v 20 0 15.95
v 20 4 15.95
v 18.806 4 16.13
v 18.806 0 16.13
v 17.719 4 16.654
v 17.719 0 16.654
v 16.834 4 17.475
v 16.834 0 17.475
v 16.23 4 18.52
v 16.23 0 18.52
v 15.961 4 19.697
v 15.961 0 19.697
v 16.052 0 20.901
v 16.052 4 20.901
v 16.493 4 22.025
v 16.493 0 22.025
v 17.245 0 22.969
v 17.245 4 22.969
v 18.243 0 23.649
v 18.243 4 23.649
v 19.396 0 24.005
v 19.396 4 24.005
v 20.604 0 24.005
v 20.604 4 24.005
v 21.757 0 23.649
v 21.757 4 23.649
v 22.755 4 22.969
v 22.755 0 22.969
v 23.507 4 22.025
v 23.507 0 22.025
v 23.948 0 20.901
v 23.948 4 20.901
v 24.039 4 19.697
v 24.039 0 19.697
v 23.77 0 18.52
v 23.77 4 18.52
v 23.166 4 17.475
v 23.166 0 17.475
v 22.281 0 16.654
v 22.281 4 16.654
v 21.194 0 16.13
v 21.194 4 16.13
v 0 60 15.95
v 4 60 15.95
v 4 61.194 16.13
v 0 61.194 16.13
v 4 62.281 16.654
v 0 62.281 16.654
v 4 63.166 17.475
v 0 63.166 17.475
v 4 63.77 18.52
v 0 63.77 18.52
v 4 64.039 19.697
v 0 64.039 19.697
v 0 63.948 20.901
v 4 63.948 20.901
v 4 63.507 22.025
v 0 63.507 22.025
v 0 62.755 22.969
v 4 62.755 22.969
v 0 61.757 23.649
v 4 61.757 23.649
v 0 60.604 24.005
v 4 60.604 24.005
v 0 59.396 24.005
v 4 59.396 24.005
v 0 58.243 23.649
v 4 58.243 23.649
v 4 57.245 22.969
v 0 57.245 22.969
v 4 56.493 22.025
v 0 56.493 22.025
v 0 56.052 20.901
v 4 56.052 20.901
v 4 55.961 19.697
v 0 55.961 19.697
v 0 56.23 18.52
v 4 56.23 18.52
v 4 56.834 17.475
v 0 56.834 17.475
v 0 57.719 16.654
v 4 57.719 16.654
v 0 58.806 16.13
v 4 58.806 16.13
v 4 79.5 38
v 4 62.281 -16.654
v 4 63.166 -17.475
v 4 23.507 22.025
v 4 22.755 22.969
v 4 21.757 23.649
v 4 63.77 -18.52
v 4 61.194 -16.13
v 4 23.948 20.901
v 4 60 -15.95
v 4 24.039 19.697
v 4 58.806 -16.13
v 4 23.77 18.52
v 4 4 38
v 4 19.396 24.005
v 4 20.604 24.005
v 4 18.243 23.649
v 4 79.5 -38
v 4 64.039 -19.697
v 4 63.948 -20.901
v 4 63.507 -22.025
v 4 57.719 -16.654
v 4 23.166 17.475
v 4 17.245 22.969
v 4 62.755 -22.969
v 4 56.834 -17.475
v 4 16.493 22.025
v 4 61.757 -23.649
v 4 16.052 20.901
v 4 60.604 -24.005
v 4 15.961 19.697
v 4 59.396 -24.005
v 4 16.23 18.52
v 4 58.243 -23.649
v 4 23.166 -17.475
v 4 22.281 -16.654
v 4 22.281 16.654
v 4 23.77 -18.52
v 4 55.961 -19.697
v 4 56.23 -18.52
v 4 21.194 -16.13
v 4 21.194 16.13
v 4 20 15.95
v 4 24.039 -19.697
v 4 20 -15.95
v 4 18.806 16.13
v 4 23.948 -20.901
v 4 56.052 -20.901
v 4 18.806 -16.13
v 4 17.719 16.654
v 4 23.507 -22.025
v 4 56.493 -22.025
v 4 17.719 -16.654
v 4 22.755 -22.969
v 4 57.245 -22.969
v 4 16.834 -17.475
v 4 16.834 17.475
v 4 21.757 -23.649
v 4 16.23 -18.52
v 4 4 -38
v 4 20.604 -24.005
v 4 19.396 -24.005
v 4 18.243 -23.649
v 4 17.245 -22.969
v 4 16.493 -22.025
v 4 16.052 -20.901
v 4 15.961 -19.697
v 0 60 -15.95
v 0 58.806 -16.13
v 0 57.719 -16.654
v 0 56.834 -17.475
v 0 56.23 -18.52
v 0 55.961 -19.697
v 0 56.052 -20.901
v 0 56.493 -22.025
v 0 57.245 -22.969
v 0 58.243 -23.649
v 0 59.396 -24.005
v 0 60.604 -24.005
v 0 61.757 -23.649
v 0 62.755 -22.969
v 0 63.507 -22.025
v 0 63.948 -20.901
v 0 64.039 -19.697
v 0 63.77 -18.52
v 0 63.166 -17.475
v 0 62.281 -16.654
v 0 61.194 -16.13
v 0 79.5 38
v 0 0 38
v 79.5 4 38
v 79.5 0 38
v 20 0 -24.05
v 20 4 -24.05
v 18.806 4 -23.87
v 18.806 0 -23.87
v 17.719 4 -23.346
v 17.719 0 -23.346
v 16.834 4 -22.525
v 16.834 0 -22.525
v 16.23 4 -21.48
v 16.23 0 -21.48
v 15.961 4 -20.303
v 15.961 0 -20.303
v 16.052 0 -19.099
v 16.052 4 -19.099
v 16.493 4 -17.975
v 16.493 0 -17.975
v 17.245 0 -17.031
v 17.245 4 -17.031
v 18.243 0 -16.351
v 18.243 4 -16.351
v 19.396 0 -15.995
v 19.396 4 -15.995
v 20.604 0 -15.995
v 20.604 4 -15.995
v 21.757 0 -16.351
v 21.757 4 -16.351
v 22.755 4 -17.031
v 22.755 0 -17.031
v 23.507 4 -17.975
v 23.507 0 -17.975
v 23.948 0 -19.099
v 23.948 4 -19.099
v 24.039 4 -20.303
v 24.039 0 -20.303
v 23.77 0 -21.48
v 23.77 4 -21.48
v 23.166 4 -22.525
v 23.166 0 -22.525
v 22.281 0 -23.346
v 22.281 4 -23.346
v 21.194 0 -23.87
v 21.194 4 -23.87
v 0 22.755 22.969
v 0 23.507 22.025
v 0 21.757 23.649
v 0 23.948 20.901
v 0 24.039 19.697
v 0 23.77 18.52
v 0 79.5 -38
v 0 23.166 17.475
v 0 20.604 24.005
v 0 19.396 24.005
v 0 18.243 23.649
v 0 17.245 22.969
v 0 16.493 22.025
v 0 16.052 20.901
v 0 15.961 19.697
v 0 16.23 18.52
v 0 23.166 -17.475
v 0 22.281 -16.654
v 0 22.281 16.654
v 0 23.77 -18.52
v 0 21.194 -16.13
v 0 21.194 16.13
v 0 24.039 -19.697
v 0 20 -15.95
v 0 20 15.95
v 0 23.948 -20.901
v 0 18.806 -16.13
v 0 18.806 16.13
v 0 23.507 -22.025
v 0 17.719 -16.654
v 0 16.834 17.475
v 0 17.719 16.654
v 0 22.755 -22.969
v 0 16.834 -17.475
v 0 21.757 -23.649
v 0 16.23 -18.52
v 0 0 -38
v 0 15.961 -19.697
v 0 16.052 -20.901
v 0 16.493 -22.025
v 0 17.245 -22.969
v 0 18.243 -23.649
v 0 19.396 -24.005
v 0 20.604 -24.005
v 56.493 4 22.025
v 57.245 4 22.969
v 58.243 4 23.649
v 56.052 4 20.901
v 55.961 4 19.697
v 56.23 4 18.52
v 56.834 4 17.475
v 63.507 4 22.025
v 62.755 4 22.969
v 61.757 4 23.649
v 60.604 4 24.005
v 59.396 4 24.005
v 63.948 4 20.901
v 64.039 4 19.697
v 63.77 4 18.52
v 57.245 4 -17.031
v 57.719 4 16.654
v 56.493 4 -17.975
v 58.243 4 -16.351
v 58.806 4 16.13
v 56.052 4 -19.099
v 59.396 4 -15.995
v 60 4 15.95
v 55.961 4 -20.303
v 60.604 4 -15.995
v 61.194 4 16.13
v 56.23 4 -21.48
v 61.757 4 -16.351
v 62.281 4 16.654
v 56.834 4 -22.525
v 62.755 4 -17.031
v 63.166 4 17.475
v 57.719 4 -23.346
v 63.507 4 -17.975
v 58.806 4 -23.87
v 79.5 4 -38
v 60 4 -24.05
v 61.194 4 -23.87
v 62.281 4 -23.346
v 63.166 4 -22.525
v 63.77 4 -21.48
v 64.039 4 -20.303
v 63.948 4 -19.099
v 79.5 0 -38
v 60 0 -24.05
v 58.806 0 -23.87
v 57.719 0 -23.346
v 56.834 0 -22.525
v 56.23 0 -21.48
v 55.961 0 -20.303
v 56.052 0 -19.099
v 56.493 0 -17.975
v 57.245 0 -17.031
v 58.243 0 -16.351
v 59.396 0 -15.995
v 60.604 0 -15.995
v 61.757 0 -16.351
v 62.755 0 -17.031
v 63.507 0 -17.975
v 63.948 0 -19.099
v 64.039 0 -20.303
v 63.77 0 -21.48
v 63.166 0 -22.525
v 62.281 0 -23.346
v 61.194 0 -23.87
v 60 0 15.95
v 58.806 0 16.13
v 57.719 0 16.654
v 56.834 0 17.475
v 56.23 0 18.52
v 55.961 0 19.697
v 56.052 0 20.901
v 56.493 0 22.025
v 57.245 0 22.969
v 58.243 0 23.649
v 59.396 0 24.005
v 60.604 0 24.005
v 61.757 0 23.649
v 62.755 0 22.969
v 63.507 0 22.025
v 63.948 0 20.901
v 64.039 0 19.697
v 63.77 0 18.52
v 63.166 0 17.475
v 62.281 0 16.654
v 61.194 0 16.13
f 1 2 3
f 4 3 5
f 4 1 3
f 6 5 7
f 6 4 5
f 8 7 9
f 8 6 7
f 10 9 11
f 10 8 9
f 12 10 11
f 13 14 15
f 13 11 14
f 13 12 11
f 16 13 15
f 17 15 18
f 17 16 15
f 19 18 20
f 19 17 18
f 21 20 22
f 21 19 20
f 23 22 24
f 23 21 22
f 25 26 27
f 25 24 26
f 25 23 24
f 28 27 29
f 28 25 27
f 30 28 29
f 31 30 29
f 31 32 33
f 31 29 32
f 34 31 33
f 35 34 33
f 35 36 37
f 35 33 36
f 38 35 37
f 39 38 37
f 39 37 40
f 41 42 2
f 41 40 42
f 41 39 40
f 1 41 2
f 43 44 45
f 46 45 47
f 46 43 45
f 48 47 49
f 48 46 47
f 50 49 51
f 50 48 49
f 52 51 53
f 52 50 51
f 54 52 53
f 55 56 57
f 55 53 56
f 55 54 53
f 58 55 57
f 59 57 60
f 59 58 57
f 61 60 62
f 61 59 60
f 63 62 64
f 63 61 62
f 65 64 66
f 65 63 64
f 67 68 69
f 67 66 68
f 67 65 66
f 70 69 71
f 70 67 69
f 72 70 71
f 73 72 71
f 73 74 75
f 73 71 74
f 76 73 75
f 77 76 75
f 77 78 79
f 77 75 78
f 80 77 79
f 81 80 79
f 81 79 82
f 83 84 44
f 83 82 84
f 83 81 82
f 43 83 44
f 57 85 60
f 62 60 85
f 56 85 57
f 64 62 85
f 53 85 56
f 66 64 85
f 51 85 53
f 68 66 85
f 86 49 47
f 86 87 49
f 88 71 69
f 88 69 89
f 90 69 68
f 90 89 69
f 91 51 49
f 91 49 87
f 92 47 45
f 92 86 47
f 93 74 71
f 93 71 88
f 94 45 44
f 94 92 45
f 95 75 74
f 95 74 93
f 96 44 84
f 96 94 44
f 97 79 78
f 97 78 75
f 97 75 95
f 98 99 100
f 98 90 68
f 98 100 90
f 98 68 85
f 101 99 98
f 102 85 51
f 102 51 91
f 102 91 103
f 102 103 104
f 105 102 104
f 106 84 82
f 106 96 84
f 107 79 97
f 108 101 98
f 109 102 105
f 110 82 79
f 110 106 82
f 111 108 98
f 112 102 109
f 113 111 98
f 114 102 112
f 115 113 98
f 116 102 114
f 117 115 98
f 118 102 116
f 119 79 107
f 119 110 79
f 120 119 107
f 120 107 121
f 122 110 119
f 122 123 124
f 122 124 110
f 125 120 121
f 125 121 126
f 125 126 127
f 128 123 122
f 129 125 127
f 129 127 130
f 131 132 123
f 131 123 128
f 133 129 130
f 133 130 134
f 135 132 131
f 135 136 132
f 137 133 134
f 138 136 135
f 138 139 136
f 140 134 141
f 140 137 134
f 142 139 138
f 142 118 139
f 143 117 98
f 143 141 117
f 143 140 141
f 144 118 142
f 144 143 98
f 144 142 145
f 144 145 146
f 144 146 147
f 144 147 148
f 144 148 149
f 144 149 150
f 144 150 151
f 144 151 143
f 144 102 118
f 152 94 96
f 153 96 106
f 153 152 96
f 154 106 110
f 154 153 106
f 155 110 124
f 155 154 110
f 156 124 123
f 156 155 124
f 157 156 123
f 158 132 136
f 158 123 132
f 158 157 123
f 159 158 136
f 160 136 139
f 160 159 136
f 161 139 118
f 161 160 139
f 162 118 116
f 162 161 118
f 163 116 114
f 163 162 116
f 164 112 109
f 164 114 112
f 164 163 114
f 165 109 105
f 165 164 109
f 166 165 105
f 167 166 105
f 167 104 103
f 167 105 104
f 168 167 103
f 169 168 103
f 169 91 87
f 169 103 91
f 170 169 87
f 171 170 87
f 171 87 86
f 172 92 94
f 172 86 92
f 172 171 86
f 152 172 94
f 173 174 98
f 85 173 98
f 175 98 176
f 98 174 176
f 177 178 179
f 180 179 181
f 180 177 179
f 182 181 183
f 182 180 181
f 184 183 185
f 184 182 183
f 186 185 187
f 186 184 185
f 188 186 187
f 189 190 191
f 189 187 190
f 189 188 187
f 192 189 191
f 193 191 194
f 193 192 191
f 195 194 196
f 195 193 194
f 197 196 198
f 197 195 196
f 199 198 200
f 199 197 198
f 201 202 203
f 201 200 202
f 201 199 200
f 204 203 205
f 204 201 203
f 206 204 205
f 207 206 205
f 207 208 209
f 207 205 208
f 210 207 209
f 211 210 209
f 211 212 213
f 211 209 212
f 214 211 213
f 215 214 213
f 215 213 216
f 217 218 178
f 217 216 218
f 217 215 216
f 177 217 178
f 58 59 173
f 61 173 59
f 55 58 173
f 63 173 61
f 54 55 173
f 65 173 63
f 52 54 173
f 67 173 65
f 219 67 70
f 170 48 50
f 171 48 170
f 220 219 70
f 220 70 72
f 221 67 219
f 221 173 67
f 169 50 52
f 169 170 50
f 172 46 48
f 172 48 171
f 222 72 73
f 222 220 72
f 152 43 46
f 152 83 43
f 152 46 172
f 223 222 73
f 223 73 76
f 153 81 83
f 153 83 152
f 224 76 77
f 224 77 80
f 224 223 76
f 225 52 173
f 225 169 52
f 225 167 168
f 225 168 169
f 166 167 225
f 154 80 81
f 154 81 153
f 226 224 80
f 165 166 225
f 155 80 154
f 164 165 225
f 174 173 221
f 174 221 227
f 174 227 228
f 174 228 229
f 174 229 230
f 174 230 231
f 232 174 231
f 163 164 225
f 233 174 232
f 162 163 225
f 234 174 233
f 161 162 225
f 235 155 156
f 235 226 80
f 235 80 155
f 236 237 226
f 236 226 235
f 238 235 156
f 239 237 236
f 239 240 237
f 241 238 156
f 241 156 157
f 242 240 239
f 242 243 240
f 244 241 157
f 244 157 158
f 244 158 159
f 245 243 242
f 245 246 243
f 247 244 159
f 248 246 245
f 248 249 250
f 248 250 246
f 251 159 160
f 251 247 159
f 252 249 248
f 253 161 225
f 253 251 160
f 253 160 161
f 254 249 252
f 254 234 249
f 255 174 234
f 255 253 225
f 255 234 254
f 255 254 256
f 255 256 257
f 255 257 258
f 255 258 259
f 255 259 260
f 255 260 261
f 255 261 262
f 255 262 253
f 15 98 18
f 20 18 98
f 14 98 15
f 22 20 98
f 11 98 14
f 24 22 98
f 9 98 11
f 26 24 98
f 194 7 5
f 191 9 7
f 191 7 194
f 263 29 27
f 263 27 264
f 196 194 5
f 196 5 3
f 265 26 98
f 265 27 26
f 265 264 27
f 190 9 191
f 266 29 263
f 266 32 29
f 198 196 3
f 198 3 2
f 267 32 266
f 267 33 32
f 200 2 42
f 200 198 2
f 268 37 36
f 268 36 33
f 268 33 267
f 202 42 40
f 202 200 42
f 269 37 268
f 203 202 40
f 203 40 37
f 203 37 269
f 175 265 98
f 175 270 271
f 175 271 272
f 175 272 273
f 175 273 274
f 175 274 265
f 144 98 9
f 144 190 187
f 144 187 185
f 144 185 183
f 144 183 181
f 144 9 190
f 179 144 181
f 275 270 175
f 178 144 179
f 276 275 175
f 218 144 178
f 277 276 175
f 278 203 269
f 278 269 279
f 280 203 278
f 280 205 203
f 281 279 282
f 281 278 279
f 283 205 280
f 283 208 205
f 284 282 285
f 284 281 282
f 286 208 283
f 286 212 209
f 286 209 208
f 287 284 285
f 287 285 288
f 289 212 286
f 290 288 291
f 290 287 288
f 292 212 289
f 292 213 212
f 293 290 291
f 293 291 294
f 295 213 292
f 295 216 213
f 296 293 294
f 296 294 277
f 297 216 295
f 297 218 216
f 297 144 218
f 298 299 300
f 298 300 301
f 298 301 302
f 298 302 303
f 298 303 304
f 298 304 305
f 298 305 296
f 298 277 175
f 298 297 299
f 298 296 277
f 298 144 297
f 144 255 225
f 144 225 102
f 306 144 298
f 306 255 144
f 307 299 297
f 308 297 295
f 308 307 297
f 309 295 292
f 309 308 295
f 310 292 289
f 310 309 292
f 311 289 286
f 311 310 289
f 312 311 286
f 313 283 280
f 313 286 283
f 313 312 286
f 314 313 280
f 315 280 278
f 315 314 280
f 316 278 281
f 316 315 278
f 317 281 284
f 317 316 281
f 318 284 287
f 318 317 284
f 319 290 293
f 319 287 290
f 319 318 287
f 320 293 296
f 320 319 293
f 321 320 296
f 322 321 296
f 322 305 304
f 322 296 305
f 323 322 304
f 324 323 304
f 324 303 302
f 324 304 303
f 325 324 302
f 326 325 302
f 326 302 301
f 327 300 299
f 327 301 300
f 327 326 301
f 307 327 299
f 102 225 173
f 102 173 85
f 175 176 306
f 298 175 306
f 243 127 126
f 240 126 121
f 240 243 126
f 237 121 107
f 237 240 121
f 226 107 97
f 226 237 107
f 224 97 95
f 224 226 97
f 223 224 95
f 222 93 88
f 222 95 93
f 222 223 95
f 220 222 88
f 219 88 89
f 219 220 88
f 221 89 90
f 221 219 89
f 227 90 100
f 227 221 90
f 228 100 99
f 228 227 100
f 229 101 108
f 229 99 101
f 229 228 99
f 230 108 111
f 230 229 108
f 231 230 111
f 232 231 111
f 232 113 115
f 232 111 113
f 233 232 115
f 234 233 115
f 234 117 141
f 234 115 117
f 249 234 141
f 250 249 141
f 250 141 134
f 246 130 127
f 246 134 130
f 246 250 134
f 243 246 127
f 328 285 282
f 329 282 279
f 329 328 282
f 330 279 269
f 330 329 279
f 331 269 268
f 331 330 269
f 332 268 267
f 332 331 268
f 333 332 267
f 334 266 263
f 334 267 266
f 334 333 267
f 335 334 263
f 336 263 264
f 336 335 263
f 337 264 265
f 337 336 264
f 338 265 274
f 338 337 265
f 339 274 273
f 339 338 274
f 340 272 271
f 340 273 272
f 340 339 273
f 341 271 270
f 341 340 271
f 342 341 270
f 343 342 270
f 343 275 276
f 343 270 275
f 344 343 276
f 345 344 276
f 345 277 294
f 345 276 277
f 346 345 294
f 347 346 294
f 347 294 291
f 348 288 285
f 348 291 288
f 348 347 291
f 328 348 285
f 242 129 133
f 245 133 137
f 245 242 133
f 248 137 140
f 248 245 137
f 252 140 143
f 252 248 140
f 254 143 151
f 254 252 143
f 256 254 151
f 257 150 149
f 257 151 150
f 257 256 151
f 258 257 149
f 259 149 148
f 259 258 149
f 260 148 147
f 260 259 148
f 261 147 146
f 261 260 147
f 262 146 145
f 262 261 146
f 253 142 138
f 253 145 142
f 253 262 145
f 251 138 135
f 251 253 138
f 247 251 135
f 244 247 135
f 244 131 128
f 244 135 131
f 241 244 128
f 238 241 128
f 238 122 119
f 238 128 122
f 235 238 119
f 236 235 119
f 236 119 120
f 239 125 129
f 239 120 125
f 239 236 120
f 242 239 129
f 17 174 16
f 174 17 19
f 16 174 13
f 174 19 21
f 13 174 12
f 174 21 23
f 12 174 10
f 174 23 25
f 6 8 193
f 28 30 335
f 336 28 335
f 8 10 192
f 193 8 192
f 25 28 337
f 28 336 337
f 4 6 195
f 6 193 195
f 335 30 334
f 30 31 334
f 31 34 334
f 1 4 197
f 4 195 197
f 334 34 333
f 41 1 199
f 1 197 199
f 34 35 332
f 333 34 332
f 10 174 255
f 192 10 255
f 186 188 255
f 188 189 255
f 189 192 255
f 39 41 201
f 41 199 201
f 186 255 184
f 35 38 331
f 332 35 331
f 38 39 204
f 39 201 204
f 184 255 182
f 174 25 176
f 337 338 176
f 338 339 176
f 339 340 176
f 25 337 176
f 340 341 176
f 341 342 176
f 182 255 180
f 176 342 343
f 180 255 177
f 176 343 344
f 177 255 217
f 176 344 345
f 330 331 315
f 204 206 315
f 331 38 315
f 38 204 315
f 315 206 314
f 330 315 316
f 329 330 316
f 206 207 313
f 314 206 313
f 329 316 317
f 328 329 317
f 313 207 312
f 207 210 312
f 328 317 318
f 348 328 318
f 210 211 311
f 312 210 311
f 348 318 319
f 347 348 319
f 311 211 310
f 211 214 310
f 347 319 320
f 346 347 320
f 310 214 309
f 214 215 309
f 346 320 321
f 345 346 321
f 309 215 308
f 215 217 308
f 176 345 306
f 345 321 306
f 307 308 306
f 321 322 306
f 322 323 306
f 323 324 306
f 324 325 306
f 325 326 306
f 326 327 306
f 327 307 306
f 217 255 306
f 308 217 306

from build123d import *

# Parameters (mm, degrees)
SKETCH1_W               = 79.5
SKETCH1_H               = 76
SKETCH1_R               = 4.05
BOSS_EXTRUDE1_DEPTH     = 79.5
SKETCH2_R               = 4.05
CUT_EXTRUDE1_DEPTH      = 79.5
CUT_EXTRUDE2_DEPTH      = 79.5
CUT_EXTRUDE2_DEPTH_BACK = 79.5
CUT_EXTRUDE3_DEPTH      = 79.5
CUT_EXTRUDE3_DEPTH_BACK = 79.5
SKETCH4_W               = 80.771817398
SKETCH4_H               = 76.525441438


with BuildPart() as part:
    # Sketch1 → Boss-Extrude1 (new body)
    with BuildSketch(Plane(origin=(0, 0, 0), x_dir=(1, 0, 0), z_dir=(0, 1, 0))):
        with Locations((39.75, 0)):
            Rectangle(SKETCH1_W, SKETCH1_H)
        with Locations(Location((20, 20, 0), (0, 0, 90))):
            Circle(SKETCH1_R, mode=Mode.SUBTRACT)
        with Locations(Location((60, 20, 0), (0, 0, 90))):
            Circle(SKETCH1_R, mode=Mode.SUBTRACT)
        with Locations(Location((60, -20, 0), (0, 0, 90))):
            Circle(SKETCH1_R, mode=Mode.SUBTRACT)
        with Locations(Location((20, -20, 0), (0, 0, 90))):
            Circle(SKETCH1_R, mode=Mode.SUBTRACT)
    extrude(amount=BOSS_EXTRUDE1_DEPTH)

    # Sketch2 → Cut-Extrude1 (cut)
    with BuildSketch(Plane(origin=(0, 0, 0), x_dir=(0, 0, -1), z_dir=(1, 0, 0))):
        with Locations((-20, 60)):
            Circle(SKETCH2_R)
        with Locations(Location((20, 60, 0), (0, 0, 180))):
            Circle(SKETCH2_R)
        with Locations(Location((20, 20, 0), (0, 0, 180))):
            Circle(SKETCH2_R)
        with Locations((-20, 20)):
            Circle(SKETCH2_R)
    extrude(amount=CUT_EXTRUDE1_DEPTH, mode=Mode.SUBTRACT)

    # Sketch3 → Cut-Extrude2 (cut, two sides: drawn at the far end of the back side and taken through both)
    with BuildSketch(Plane.XY.offset(-CUT_EXTRUDE2_DEPTH_BACK)):
        Polygon((4, 73.843145751), (4, 4), (73.843145751, 4), align=None)
        Polygon((4, 79.5), (79.5, 4), (79.5, 79.5), align=None)
    extrude(amount=CUT_EXTRUDE2_DEPTH + CUT_EXTRUDE2_DEPTH_BACK, mode=Mode.SUBTRACT)

    # Sketch4 → Cut-Extrude3 (cut, two sides: drawn at the far end of the back side and taken through both)
    with BuildSketch(Plane.XY.offset(-CUT_EXTRUDE3_DEPTH_BACK)):
        with Locations((44.385908699, 42.262720719)):
            Rectangle(SKETCH4_W, SKETCH4_H)
    extrude(amount=CUT_EXTRUDE3_DEPTH + CUT_EXTRUDE3_DEPTH_BACK, mode=Mode.SUBTRACT)


solid = part.part
